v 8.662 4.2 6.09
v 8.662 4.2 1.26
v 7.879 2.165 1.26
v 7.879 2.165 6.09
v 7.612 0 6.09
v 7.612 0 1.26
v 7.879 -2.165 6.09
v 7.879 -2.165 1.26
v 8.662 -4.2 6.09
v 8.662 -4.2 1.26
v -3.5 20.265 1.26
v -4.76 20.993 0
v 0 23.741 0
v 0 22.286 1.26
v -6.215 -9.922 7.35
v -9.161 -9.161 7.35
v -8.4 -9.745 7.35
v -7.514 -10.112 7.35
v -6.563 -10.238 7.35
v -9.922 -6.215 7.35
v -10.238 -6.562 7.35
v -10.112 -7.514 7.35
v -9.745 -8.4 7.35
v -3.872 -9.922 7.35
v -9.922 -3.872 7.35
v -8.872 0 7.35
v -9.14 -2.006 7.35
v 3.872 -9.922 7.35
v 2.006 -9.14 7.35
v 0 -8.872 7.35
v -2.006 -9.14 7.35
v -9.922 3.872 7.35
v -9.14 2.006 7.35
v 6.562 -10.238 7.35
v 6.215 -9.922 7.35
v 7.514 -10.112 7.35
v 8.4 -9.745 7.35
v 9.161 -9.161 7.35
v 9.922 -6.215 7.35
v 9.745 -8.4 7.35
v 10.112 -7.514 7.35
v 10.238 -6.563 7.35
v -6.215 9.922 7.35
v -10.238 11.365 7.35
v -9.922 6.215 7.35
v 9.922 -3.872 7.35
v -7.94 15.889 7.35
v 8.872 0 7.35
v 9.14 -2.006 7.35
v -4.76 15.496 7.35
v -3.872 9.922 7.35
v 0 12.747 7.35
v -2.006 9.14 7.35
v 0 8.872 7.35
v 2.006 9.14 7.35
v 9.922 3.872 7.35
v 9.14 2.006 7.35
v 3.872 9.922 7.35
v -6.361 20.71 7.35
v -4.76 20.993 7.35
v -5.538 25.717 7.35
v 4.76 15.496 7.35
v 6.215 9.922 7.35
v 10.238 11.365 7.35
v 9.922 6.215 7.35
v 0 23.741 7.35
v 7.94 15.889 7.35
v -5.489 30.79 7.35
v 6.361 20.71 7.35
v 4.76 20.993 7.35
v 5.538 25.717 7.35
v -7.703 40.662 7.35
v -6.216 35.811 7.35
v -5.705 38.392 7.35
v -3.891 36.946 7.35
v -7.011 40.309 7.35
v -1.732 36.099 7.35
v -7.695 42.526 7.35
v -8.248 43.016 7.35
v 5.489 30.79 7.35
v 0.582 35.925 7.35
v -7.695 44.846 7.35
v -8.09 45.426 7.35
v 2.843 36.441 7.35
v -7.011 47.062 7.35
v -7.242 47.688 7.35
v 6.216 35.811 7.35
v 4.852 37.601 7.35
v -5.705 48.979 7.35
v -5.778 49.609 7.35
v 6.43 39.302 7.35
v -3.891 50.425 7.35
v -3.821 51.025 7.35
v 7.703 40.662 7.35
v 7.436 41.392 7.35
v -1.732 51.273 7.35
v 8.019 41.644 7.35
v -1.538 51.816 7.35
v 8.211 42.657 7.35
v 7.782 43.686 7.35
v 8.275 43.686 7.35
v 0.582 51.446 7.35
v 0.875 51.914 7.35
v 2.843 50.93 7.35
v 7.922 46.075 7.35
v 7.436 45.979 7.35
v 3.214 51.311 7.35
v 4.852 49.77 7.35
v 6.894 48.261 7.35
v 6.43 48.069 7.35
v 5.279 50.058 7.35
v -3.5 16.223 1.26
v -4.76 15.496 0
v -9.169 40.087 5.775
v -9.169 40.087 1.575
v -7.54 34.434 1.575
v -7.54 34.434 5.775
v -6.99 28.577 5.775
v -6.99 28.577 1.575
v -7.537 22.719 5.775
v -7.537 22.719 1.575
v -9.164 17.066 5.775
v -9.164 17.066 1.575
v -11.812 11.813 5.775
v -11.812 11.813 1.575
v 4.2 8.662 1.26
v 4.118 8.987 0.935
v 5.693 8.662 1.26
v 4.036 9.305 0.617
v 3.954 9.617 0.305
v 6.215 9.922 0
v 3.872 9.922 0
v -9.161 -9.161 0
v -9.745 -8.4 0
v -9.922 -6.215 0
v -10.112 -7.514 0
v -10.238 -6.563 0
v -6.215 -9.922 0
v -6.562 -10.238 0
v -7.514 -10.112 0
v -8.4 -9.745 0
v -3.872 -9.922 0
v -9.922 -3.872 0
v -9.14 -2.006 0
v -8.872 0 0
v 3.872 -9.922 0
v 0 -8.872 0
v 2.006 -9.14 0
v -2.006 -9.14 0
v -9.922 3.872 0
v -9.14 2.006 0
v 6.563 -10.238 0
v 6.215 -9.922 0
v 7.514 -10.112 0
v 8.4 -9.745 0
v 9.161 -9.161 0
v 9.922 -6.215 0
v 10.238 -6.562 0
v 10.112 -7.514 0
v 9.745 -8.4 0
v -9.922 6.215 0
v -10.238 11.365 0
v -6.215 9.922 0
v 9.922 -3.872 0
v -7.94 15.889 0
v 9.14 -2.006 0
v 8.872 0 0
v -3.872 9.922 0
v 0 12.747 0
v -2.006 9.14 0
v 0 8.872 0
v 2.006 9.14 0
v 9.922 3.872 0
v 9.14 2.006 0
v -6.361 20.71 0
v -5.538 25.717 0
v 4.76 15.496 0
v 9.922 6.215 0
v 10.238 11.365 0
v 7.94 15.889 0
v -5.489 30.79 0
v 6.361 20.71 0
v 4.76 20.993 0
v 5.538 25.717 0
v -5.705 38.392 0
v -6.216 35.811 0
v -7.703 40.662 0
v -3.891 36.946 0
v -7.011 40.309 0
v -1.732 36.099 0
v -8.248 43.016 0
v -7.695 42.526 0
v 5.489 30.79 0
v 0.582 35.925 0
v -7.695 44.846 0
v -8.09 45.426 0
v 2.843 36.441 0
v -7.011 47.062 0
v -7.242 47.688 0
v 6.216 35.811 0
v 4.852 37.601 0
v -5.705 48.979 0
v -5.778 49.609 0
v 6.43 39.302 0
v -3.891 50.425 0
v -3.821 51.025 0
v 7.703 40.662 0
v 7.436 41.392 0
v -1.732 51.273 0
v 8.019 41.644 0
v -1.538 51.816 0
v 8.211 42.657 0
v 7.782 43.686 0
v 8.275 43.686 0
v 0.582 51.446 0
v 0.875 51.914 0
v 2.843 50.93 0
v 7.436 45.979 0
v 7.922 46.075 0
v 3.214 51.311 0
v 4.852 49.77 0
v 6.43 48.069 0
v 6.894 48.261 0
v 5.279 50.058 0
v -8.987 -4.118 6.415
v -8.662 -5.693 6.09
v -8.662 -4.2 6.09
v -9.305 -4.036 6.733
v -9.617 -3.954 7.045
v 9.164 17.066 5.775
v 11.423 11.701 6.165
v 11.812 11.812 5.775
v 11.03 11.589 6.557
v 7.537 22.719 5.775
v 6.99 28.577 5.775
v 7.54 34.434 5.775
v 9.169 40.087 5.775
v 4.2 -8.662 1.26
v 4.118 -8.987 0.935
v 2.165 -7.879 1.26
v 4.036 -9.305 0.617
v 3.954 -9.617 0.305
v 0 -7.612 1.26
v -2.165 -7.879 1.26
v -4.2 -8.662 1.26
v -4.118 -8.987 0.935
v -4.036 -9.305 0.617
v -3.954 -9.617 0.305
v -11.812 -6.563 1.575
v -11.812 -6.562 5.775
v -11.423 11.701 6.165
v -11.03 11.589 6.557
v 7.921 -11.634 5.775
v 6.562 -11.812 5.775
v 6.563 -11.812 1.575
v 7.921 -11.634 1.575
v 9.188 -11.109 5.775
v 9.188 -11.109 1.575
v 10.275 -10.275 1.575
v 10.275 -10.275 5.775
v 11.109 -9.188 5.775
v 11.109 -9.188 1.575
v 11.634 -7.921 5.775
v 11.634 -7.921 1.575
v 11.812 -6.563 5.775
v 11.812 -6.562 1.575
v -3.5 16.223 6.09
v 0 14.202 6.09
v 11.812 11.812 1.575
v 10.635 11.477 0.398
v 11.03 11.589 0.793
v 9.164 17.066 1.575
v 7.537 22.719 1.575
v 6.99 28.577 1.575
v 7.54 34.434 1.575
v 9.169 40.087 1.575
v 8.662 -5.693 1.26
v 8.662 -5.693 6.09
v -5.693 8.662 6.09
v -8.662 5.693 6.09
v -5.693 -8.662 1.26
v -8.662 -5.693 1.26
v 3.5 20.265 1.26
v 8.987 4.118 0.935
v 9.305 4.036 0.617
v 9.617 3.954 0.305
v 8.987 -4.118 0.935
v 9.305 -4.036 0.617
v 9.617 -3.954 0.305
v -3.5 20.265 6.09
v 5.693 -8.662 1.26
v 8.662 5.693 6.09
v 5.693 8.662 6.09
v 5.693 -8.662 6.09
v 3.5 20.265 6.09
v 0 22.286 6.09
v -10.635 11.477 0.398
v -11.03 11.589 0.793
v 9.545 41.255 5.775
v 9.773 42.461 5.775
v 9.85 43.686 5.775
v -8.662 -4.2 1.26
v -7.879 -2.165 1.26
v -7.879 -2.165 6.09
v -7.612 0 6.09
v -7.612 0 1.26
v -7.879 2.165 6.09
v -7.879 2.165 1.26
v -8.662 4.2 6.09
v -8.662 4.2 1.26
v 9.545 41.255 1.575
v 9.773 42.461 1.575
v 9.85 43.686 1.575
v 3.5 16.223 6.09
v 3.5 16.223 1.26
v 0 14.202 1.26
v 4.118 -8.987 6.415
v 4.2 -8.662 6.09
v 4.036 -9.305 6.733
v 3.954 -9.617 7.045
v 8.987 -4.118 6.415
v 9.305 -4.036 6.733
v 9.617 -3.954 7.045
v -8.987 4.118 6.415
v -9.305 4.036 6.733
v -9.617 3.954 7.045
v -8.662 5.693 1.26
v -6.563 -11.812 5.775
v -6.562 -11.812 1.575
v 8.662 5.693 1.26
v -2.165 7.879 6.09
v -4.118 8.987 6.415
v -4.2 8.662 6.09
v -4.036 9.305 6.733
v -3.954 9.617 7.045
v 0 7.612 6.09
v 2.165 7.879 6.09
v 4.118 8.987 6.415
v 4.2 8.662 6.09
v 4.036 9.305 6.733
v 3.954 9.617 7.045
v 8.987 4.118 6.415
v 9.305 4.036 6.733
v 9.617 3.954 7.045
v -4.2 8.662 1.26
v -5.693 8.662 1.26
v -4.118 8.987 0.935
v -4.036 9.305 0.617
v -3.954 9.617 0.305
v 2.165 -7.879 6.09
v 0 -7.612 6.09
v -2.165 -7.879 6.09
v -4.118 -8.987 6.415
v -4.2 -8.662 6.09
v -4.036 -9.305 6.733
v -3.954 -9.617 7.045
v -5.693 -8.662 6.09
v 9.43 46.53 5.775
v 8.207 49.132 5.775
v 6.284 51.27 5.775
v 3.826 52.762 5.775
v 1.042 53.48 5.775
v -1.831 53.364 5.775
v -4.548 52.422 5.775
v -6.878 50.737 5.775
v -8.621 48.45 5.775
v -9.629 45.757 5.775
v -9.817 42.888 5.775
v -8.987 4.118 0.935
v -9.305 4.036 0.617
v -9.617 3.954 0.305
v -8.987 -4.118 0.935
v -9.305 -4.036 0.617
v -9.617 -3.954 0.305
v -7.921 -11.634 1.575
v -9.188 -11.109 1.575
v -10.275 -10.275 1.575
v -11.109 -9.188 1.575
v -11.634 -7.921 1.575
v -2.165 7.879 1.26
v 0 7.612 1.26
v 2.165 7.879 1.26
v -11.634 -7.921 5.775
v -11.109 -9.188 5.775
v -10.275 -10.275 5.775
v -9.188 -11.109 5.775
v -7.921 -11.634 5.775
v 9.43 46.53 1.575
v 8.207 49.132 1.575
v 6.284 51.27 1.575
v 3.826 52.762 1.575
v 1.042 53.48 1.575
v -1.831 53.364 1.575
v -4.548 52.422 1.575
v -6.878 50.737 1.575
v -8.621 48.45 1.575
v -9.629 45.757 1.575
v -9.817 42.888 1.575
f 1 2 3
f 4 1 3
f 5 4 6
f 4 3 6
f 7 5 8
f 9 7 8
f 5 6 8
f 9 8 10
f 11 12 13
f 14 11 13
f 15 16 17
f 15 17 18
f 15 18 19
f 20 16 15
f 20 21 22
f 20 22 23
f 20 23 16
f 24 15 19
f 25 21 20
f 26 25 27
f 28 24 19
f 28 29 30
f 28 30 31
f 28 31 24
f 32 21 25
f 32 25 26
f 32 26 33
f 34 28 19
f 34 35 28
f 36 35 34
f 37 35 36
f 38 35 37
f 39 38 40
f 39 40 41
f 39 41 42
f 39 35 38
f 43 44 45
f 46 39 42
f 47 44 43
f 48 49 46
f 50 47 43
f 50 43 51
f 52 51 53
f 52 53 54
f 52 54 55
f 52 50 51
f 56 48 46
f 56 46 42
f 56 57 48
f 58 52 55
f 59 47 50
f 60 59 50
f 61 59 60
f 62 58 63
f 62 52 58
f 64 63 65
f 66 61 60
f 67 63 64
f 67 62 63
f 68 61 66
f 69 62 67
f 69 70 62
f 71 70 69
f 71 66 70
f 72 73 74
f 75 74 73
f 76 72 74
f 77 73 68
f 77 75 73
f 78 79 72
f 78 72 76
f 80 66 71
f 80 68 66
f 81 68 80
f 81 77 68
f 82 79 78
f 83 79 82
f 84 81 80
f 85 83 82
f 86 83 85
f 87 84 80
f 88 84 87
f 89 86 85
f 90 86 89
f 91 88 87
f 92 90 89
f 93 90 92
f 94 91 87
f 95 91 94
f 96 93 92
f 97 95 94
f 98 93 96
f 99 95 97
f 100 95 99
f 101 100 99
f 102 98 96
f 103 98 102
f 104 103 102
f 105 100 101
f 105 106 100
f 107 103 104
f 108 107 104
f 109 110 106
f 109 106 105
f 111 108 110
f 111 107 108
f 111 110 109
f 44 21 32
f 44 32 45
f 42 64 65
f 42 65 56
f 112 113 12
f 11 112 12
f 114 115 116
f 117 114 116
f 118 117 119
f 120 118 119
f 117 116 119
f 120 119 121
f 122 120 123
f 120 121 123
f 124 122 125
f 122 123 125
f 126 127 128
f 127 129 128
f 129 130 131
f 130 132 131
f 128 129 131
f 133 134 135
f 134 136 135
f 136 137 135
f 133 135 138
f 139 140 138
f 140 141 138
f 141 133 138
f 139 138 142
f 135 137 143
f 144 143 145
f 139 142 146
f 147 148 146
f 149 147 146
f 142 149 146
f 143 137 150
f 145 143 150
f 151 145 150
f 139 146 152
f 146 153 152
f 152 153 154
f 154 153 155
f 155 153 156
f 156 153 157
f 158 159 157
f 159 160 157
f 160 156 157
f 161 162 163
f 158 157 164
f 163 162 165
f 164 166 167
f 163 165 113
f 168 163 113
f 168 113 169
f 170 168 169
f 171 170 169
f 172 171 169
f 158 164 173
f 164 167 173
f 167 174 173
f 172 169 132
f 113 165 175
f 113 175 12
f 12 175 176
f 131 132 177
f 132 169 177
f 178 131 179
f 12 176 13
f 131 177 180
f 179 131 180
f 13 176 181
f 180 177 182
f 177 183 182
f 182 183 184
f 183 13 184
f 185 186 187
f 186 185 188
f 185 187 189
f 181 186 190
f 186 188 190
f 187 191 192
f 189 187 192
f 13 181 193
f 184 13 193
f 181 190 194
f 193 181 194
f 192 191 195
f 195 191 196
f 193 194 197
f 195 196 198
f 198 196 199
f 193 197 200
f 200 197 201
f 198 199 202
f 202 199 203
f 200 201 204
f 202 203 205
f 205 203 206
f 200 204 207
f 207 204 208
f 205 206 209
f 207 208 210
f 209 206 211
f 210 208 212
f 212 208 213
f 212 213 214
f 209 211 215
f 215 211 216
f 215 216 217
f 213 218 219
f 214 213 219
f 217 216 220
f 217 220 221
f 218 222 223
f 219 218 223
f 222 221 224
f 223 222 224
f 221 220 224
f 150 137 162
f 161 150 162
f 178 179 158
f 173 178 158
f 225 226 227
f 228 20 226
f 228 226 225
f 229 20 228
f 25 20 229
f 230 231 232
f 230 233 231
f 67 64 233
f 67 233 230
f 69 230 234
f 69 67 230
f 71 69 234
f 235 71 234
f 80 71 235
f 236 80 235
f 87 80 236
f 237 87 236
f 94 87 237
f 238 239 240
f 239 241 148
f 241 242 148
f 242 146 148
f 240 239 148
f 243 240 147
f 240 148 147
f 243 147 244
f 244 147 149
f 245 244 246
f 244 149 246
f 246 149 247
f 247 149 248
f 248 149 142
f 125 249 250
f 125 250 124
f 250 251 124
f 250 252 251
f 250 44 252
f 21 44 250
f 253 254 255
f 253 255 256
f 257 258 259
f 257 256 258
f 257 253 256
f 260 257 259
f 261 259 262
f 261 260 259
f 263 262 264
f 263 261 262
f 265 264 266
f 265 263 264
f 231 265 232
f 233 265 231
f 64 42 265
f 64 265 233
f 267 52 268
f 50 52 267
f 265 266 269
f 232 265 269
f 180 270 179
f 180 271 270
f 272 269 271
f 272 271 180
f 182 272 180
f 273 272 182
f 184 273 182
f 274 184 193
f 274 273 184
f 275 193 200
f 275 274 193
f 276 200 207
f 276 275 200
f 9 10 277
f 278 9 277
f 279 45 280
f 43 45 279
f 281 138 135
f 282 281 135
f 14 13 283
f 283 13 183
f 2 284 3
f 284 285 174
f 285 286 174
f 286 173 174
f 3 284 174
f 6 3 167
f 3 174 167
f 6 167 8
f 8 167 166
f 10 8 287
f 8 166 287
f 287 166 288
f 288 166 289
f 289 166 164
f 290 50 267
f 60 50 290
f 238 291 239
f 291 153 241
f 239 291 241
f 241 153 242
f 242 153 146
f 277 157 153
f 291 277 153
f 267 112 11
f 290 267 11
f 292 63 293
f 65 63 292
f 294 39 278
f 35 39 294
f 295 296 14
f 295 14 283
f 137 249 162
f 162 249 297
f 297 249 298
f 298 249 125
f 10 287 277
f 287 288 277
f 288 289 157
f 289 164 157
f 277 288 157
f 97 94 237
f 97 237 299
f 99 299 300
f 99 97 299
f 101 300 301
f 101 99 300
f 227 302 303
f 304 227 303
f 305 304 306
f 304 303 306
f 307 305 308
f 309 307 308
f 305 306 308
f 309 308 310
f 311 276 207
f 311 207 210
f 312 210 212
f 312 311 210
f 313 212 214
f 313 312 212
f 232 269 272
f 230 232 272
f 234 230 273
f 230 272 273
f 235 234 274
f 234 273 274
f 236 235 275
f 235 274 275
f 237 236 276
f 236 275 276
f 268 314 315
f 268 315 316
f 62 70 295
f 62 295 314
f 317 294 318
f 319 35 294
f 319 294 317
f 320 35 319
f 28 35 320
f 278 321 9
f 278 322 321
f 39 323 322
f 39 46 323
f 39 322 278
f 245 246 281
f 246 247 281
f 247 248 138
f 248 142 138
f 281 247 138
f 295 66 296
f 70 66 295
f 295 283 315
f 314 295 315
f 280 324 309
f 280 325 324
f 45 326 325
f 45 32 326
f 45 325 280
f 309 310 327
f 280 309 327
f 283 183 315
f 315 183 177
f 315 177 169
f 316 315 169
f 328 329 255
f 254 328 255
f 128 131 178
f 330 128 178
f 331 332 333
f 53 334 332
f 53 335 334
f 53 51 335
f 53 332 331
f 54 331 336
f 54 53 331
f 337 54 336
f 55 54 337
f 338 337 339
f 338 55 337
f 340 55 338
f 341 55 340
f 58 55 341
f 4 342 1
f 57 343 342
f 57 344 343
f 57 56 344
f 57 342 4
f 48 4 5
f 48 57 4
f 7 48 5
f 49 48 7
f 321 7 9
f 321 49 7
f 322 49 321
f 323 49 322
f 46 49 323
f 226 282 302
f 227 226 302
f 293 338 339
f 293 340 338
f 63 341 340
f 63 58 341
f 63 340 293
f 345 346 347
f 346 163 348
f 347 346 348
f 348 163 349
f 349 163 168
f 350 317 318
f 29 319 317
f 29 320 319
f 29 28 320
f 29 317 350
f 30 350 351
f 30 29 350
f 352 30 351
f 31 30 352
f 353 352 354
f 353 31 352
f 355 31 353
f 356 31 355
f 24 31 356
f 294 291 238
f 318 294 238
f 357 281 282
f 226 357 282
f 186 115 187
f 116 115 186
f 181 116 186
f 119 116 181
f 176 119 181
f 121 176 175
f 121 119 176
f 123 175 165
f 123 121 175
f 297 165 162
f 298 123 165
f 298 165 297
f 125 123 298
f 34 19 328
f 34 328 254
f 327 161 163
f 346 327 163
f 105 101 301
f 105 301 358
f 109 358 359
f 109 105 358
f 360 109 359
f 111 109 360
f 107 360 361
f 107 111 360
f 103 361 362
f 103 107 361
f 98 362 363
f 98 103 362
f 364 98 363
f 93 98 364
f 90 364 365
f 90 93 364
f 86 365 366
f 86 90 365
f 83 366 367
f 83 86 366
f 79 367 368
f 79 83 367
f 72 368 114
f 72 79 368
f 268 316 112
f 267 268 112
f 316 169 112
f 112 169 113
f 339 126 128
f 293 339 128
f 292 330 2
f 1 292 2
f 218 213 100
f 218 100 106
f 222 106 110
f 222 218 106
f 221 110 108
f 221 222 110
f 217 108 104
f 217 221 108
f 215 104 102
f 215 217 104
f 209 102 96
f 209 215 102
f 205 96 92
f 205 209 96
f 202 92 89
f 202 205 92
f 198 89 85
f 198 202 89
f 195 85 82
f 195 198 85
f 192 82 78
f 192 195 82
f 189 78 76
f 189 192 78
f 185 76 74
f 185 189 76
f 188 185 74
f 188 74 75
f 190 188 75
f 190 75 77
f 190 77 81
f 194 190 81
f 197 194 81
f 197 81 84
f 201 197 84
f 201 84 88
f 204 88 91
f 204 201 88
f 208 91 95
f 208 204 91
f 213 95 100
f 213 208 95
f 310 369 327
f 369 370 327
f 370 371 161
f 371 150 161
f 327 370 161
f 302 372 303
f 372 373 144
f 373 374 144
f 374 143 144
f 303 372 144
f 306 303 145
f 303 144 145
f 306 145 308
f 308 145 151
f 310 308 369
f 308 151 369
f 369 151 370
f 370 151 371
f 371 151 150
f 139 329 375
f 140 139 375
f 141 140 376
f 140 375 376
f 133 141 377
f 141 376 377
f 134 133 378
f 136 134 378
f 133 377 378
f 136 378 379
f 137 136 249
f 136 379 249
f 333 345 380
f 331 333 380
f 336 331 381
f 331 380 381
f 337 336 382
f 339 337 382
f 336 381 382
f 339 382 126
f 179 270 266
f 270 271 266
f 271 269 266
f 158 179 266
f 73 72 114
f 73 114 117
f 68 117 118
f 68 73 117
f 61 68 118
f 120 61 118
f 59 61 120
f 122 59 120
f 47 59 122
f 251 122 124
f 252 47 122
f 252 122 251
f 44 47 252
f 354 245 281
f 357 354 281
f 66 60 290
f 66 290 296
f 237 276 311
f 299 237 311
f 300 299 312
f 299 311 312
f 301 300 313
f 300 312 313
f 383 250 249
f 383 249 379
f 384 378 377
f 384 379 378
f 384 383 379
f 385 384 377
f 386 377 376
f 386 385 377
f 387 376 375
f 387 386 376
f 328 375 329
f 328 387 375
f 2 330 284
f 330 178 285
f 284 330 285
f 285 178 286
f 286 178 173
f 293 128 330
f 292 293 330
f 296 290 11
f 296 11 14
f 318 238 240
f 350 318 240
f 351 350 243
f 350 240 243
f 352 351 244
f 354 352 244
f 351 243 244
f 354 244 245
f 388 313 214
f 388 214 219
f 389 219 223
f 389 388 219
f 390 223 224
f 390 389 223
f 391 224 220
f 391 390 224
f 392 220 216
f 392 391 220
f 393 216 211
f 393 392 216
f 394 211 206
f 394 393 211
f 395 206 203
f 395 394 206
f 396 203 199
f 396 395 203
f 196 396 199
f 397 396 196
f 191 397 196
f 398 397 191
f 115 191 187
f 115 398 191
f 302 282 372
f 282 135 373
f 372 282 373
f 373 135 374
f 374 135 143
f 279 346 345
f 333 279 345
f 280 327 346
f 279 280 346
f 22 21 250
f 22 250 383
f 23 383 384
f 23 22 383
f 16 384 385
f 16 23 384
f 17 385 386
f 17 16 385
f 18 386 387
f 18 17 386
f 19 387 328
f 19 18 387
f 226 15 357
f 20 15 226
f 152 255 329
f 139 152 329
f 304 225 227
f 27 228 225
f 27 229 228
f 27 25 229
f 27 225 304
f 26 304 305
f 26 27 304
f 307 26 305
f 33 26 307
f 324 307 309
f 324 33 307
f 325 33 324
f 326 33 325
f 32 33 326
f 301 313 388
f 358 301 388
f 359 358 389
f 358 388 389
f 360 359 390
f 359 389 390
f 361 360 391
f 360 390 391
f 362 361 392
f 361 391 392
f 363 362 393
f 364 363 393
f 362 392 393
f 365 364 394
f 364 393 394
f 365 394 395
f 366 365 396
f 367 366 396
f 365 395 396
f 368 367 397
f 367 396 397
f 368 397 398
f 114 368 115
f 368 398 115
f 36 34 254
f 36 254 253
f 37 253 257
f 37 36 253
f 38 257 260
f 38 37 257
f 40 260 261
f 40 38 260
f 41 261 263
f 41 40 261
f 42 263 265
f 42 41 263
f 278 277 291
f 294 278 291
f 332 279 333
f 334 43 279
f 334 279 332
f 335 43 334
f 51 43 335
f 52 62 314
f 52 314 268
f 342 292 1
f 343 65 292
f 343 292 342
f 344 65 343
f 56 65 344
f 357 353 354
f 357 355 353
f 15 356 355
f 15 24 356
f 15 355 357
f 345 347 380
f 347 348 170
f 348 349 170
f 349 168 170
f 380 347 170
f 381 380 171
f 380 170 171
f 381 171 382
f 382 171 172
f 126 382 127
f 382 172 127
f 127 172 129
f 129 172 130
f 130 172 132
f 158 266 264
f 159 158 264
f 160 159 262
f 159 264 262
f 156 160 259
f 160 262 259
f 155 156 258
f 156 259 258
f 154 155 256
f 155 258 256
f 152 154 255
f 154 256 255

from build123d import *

# Parameters (mm, degrees)
F0_W     = 22.5
F0_H     = 22.5
F0_R     = 7.4115696456
F1_DEPTH = 7
F2_SIZE  = 1.2
F3_R     = 5
F4_SIZE  = 1.5
F5_SCALE = 1.05


with BuildPart() as f1:
    # F0 (on Top) → F1 (new body)
    with BuildSketch(Plane.XY):
        Rectangle(F0_W, F0_H)
        with BuildLine():
            Line((4, 8.25), (5.4215728753, 8.25))
            Line((5.4215728753, 8.25), (8.25, 5.4215728753))
            Line((8.25, 5.4215728753), (8.25, 4))
            ThreePointArc((8.25, 4), (7.25, 0), (8.25, -4))
            Line((8.25, -4), (8.25, -5.4215728753))
            Line((8.25, -5.4215728753), (5.4215728753, -8.25))
            Line((5.4215728753, -8.25), (4, -8.25))
            ThreePointArc((4, -8.25), (0, -7.25), (-4, -8.25))
            Line((-4, -8.25), (-5.4215728753, -8.25))
            Line((-5.4215728753, -8.25), (-8.25, -5.4215728753))
            Line((-8.25, -5.4215728753), (-8.25, -4))
            ThreePointArc((-8.25, -4), (-7.25, 0), (-8.25, 4))
            Line((-8.25, 4), (-8.25, 5.4215728753))
            Line((-8.25, 5.4215728753), (-5.4215728753, 8.25))
            Line((-5.4215728753, 8.25), (-4, 8.25))
            ThreePointArc((-4, 8.25), (0, 7.25), (4, 8.25))
        make_face(mode=Mode.SUBTRACT)
        with BuildLine():
            Line((-11.25, 11.25), (11.25, 11.25))
            ThreePointArc((11.25, 11.25), (6.7870639403, 24.4144327009), (8.7322033942, 38.1780266762))
            ThreePointArc((8.7322033942, 38.1780266762), (0, 32.2246467329), (-8.7322033942, 38.1780266762))
            ThreePointArc((-8.7322033942, 38.1780266762), (-6.7870639403, 24.4144327009), (-11.25, 11.25))
        make_face()
        Polygon((3.33375, 15.4506308903), (0, 13.5258894304), (-3.33375, 15.4506308903), (-3.33375, 19.3001138101), (0, 21.22485527), (3.33375, 19.3001138101), align=None, mode=Mode.SUBTRACT)
        with BuildLine():
            ThreePointArc((-8.7322033942, 38.1780266762), (0, 32.2246467329), (8.7322033942, 38.1780266762))
            ThreePointArc((8.7322033942, 38.1780266762), (9.2171730729, 39.8612931132), (9.3807307723, 41.6053775052))
            ThreePointArc((9.3807307723, 41.6053775052), (-1.744084392, 50.8225505781), (-8.7322033942, 38.1780266762))
        make_face()
        with Locations((0, 41.6053775052)):
            Circle(F0_R, mode=Mode.SUBTRACT)
    extrude(amount=F1_DEPTH)

    # F2
    f2_edges = [f1.edges().sort_by_distance(p)[0] for p in [
        (-7.25, 0, 7),
        (-8.25, 4.710786, 7),
        (-6.835786, 6.835786, 7),
        (-4.710786, 8.25, 7),
        (0, 7.25, 7),
        (4.710786, 8.25, 7),
        (6.835786, 6.835786, 7),
        (8.25, 4.710786, 7),
        (7.25, 0, 7),
        (8.25, -4.710786, 7),
        (6.835786, -6.835786, 7),
        (4.710786, -8.25, 7),
        (0, -7.25, 7),
        (-4.710786, -8.25, 7),
        (-6.835786, -6.835786, 7),
        (-8.25, -4.710786, 7),
        (1.666875, 14.48826, 7),
        (-1.666875, 14.48826, 7),
        (-3.33375, 17.375372, 7),
        (-1.666875, 20.262485, 7),
        (1.666875, 20.262485, 7),
        (3.33375, 17.375372, 7),
        (-1.666875, 14.48826, 0),
        (1.666875, 14.48826, 0),
        (3.33375, 17.375372, 0),
        (1.666875, 20.262485, 0),
        (-1.666875, 20.262485, 0),
        (0, -7.25, 0),
        (-4.710786, -8.25, 0),
        (-6.835786, -6.835786, 0),
        (-8.25, -4.710786, 0),
        (-7.25, 0, 0),
        (-8.25, 4.710786, 0),
        (-4.710786, 8.25, 0),
        (4.710786, 8.25, 0),
        (-6.835786, 6.835786, 0),
        (0, 7.25, 0),
        (6.835786, 6.835786, 0),
        (8.25, 4.710786, 0),
        (7.25, 0, 0),
        (8.25, -4.710786, 0),
        (6.835786, -6.835786, 0),
        (4.710786, -8.25, 0),
        (-3.33375, 17.375372, 0),
    ]]
    chamfer(f2_edges, length=F2_SIZE)

    # F3
    f3_edges = [f1.edges().sort_by_distance(p)[0] for p in [
        (11.25, -11.25, 3.5),
        (-11.25, -11.25, 3.5),
    ]]
    fillet(f3_edges, radius=F3_R)

    # F4
    f4_edges = [f1.edges().sort_by_distance(p)[0] for p in [
        (0, 50.986108, 7),
        (11.25, 2.5, 7),
        (0, -11.25, 7),
        (-11.25, 2.5, 7),
        (0, 50.986108, 0),
        (-11.25, 2.5, 0),
        (0, -11.25, 0),
        (11.25, 2.5, 0),
    ]]
    chamfer(f4_edges, length=F4_SIZE)


with BuildPart() as f1_1:
    # F5: moved
    add(f1.part.scale(F5_SCALE))


solid = f1_1.part
